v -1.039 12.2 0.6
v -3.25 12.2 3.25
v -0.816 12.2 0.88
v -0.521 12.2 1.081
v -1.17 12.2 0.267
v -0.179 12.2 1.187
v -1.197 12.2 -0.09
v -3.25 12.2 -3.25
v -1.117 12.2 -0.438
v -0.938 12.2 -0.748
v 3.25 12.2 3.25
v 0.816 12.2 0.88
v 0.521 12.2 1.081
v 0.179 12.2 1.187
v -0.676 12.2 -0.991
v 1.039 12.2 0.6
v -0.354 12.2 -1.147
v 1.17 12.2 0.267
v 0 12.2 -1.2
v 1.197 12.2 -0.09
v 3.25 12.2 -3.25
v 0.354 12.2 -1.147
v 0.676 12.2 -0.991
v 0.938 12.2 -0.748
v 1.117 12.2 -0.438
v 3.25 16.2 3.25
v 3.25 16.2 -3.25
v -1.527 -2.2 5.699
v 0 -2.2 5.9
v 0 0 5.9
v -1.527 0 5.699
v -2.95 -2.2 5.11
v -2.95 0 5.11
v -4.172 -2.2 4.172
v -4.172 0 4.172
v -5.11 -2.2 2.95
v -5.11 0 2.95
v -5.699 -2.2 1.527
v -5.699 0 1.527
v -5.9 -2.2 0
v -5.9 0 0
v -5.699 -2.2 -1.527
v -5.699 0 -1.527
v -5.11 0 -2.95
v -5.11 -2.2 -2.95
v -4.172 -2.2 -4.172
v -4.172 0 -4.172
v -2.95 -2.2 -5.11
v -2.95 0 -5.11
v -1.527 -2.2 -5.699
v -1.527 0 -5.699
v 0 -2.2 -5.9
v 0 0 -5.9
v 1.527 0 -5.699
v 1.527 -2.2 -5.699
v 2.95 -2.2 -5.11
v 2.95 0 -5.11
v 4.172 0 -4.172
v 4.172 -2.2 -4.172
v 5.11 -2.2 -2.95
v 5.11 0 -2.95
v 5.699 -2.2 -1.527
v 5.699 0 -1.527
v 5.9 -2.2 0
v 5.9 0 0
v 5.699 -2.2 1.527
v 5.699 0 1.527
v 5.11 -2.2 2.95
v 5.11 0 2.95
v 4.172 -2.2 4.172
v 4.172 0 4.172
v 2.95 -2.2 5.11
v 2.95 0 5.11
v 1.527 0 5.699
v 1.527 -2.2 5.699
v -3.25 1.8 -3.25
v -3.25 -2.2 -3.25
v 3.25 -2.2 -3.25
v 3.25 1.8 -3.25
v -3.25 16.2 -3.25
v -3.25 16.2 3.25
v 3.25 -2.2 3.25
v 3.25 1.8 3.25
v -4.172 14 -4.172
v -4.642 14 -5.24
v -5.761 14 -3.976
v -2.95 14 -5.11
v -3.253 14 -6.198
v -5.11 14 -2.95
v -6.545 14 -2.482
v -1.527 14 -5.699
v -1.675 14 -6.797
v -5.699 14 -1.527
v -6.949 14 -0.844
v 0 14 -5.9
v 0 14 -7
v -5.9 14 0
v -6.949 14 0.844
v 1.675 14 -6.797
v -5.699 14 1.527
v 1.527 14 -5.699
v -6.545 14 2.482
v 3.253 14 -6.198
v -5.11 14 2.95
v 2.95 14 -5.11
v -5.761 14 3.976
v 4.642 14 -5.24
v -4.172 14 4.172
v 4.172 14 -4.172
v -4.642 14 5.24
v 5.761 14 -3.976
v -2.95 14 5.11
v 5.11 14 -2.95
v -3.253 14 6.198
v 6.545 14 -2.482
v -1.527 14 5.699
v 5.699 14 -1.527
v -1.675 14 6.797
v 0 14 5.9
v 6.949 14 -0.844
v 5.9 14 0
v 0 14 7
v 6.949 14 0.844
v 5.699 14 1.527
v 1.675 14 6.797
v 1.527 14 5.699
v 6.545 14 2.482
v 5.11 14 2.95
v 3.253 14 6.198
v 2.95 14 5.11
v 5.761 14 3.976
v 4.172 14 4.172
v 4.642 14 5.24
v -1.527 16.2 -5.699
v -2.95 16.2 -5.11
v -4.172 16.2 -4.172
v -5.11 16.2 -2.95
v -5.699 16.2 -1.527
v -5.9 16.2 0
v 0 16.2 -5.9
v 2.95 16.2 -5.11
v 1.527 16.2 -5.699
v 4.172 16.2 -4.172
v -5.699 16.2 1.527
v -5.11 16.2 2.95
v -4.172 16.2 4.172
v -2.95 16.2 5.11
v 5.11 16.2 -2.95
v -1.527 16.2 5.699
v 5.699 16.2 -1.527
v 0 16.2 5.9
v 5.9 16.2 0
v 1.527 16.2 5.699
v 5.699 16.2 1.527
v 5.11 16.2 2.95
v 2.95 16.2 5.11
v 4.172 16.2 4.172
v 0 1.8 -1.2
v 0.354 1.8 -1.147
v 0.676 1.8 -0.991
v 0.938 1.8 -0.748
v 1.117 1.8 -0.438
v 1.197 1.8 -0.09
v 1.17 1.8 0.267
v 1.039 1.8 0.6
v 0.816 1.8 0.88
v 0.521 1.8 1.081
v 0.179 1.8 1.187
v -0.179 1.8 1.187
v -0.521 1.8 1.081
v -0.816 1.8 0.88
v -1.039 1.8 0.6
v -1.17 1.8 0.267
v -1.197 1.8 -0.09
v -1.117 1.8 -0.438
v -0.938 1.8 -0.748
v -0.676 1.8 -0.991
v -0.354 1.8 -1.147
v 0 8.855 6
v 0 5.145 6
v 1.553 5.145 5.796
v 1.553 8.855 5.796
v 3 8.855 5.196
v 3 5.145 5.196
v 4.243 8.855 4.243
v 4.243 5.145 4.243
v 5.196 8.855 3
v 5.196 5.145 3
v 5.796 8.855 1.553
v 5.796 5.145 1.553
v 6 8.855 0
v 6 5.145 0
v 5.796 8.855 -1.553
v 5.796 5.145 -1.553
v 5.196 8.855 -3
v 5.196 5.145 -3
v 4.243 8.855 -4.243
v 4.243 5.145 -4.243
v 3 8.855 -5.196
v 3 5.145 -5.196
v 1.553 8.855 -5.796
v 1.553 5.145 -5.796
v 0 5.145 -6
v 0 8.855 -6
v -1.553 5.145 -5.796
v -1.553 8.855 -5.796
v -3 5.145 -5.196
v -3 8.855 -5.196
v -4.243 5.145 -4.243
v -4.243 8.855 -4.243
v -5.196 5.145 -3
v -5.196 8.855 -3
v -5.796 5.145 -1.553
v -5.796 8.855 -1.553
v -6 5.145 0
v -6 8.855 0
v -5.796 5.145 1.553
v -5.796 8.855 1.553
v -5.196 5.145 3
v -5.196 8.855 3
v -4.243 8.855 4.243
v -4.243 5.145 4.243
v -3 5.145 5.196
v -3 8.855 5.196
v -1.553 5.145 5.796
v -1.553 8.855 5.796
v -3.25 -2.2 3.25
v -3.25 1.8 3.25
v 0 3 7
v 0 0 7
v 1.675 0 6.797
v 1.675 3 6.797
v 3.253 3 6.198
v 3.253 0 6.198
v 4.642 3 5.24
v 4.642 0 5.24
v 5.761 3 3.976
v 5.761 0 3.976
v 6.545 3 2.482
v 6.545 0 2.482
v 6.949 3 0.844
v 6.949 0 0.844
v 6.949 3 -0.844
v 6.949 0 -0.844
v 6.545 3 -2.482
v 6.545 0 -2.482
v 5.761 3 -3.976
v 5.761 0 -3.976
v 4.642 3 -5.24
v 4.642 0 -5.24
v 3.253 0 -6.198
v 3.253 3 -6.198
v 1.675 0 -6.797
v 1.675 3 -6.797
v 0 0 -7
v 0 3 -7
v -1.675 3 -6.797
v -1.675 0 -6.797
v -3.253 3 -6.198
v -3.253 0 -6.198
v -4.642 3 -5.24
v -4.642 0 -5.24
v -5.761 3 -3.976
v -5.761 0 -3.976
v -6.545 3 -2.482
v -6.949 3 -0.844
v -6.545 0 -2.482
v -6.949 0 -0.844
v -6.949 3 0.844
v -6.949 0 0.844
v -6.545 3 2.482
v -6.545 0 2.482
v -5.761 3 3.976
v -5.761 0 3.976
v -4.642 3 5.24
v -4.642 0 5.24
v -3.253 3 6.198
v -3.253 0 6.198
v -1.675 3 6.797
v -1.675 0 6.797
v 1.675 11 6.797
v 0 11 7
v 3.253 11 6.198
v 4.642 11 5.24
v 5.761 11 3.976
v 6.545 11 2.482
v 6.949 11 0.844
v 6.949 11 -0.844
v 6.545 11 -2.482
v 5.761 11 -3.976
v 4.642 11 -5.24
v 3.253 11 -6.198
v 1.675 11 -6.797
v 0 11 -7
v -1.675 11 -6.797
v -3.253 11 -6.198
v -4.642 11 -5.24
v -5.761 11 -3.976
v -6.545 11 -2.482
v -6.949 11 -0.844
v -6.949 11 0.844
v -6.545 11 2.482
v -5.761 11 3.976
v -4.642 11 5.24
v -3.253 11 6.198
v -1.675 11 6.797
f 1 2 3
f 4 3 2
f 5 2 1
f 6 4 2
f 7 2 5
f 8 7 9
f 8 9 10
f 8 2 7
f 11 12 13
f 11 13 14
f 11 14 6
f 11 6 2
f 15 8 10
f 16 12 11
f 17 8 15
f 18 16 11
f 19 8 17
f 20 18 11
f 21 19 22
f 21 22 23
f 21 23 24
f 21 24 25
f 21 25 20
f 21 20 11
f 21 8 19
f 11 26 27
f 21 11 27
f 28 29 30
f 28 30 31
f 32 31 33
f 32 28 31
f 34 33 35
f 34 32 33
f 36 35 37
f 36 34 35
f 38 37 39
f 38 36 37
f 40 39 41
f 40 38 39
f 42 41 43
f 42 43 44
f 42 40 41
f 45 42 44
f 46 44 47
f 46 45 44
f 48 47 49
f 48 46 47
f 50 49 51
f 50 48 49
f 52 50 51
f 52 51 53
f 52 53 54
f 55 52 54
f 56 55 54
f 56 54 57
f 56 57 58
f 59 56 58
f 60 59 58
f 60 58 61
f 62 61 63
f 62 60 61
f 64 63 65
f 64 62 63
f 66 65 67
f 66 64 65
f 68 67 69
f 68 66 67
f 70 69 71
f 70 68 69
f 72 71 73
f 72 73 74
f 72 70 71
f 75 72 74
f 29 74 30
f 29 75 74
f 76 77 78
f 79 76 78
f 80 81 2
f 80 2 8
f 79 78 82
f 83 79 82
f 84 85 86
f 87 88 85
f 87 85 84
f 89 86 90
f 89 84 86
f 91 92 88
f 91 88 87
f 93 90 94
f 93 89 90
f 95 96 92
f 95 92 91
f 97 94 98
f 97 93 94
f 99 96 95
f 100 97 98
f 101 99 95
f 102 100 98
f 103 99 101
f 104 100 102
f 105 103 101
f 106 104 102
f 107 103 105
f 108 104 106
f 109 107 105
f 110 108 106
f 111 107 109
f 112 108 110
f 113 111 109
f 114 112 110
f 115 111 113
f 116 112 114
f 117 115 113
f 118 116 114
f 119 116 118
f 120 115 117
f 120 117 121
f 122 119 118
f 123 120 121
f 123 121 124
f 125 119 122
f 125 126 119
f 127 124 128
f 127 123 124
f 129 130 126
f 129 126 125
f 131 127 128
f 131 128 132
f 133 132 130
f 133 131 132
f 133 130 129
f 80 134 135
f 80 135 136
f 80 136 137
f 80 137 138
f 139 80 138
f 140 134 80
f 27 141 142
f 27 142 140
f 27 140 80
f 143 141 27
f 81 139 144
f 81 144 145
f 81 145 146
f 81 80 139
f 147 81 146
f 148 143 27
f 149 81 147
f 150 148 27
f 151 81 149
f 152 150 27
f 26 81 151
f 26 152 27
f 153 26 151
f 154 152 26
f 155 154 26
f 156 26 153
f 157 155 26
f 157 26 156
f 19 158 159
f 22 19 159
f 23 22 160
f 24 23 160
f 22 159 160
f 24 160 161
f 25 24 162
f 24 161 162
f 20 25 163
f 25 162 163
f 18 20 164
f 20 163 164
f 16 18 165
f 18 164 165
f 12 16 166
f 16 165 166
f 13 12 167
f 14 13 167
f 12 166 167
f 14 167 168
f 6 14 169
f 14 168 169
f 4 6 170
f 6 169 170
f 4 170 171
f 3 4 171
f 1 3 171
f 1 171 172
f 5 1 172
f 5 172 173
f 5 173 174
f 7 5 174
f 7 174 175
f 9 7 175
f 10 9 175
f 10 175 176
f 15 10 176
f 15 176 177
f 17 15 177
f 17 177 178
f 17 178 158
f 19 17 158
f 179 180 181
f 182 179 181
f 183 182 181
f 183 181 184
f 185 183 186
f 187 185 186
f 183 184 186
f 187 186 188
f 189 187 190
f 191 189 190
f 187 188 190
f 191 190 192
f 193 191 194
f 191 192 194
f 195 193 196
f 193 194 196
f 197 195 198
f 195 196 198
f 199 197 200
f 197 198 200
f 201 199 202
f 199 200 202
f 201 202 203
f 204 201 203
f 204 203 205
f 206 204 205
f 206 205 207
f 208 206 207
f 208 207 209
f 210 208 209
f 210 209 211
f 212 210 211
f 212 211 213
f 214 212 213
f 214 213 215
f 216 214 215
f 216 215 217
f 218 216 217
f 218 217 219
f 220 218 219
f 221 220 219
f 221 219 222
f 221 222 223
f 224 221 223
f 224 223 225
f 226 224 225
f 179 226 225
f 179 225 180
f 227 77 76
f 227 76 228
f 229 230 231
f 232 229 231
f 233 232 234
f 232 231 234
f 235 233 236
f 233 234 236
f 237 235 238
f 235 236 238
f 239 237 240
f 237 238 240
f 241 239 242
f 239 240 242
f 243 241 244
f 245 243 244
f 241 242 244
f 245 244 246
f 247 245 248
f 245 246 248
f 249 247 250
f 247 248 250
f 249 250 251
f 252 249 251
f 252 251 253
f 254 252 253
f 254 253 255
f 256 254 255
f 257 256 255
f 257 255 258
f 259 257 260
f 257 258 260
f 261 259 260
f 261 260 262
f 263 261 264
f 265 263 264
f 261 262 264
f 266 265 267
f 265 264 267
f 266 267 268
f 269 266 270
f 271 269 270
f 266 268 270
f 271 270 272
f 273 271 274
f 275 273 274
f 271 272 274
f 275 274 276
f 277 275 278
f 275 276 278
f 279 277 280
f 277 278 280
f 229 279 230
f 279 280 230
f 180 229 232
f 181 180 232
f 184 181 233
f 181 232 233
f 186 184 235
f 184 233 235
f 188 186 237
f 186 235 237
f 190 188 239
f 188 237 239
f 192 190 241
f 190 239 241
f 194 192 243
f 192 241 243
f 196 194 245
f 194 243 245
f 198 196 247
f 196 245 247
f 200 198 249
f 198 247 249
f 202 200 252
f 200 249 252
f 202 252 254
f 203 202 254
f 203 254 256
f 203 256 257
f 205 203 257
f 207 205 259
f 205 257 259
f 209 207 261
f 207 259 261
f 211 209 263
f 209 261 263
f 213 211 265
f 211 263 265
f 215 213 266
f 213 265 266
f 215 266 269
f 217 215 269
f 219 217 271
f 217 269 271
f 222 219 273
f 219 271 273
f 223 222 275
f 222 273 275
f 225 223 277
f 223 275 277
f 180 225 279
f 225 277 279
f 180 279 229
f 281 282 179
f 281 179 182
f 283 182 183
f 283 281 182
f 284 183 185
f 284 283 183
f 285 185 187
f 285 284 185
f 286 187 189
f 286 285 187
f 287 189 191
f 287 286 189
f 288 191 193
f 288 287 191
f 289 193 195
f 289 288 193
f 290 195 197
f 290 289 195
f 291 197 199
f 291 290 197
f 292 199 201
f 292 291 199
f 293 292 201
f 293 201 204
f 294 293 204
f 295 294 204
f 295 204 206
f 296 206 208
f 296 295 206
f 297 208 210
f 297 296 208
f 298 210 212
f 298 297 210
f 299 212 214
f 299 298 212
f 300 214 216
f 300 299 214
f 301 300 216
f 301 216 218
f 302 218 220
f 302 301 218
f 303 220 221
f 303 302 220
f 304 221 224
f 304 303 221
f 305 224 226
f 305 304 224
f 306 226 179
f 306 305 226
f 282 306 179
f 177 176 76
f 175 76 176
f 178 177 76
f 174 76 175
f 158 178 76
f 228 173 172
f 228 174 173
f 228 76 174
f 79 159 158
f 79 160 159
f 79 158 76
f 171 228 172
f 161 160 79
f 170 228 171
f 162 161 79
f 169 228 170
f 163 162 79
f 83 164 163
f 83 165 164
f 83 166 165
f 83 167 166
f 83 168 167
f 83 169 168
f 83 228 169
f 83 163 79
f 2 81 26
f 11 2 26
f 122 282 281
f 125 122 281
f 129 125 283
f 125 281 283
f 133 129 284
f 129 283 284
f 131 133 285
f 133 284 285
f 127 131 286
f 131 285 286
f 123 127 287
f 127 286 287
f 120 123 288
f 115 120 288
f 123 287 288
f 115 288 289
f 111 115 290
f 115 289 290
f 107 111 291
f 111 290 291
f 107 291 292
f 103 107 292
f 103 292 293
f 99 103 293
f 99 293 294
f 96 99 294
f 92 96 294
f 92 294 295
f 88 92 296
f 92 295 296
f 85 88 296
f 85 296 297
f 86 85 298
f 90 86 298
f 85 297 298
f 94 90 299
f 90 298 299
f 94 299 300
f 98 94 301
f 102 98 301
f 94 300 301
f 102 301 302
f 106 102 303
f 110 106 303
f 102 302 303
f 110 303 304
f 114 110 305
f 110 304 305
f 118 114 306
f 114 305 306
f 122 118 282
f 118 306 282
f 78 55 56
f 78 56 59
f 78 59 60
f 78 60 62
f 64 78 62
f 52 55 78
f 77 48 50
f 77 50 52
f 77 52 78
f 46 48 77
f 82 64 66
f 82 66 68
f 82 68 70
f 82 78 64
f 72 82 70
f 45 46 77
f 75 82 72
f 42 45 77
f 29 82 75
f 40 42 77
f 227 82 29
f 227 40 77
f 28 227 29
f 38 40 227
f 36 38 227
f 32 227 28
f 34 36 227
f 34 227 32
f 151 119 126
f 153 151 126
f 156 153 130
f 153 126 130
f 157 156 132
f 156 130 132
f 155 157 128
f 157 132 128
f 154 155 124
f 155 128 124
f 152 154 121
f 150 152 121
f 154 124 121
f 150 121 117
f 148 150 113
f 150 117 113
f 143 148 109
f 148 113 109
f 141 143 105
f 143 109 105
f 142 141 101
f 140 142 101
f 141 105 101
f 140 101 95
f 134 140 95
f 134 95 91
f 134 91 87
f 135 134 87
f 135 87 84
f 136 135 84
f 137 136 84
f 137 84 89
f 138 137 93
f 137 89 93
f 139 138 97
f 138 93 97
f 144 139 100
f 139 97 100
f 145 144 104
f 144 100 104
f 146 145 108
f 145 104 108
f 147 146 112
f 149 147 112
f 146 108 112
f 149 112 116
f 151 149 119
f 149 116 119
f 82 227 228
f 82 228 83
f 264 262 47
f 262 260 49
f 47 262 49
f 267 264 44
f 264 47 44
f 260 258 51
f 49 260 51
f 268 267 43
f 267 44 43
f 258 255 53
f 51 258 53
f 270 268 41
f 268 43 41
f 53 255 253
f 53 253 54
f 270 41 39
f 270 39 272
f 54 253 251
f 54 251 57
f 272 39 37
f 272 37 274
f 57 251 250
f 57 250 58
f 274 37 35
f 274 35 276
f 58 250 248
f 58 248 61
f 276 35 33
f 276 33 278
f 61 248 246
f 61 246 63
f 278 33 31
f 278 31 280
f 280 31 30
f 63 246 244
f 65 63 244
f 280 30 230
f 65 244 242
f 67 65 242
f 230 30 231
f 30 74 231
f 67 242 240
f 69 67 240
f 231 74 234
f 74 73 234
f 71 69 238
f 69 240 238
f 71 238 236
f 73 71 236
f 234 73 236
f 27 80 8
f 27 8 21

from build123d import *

# Parameters (mm, degrees)
SKETCH_1_R          = 7
EXTRUDE_1_DEPTH     = 3
SKETCH_2_R          = 6
EXTRUDE_2_DEPTH     = 8
SKETCH_3_R          = 7
EXTRUDE_3_DEPTH     = 3
CHAMFER_1_SIZE      = 2.144506921
CHAMFER_1_SIZE_2    = 1
CHAMFER_2_SIZE      = 2.144506921
CHAMFER_2_SIZE_2    = 1
SKETCH_4_R          = 5.9
EXTRUDE_4_DEPTH     = 2.2
EXTRUDE_START       = 2.2
SKETCH_5_R          = 5.9
EXTRUDE_5_DEPTH     = 2.2
SKETCH_6_W          = 6.5
SKETCH_6_H          = 6.5
CUT_EXTRUDE_1_DEPTH = 4
SKETCH_7_W          = 6.5
SKETCH_7_H          = 6.5
CUT_EXTRUDE_2_DEPTH = 4
SKETCH_8_R          = 1.2
CUT_EXTRUDE_3_DEPTH = 18.474552927


with BuildPart() as part:
    # Эскиз1 → Бобышка-Вытянуть1 (new body)
    with BuildSketch(Plane(origin=(0, 0, 0), x_dir=(1, 0, 0), z_dir=(0, 1, 0))):
        with Locations(Location((0, 0, 0), (0, 0, 270))):
            Circle(SKETCH_1_R)
    extrude(amount=EXTRUDE_1_DEPTH)

    # Эскиз2 → Бобышка-Вытянуть2 (add)
    with BuildSketch(Plane(origin=(0, 3, 0), x_dir=(1, 0, 0), z_dir=(0, 1, 0))):
        with Locations(Location((0, 0, 0), (0, 0, 270))):
            Circle(SKETCH_2_R)
    extrude(amount=EXTRUDE_2_DEPTH)

    # Эскиз3 → Бобышка-Вытянуть3 (add)
    with BuildSketch(Plane(origin=(0, 11, 0), x_dir=(1, 0, 0), z_dir=(0, 1, 0))):
        with Locations(Location((0, 0, 0), (0, 0, 270))):
            Circle(SKETCH_3_R)
    extrude(amount=EXTRUDE_3_DEPTH)

    # Фаска1
    # the kernel refuses this chamfer: 2.144506921, 1 mm, written as the material it adds along each edge
    with BuildSketch(Plane(origin=(0, 3, 0), x_dir=(0, 0, 1), z_dir=(-1, 0, 0))) as chamfer_1_piece_1_section:
        Polygon((6, CHAMFER_1_SIZE), (6 + CHAMFER_1_SIZE_2, 0), (6, 0), align=None)
    chamfer_1_piece_1 = revolve(axis=Axis((0, 3, 0), (0, 1, 0)), mode=Mode.PRIVATE)
    chamfer_1_piece_1 = chamfer_1_piece_1 & Plane(origin=(0, 4.095664656, 0), x_dir=(0, 0, 1), z_dir=(0, -1, 0)) * Cylinder(7, 28, mode=Mode.PRIVATE)
    add(chamfer_1_piece_1)

    # Фаска2
    # the kernel refuses this chamfer: 2.144506921, 1 mm, written as the material it adds along each edge
    with BuildSketch(Plane(origin=(0, 11, 0), x_dir=(0, 0, 1), z_dir=(-1, 0, 0))) as chamfer_2_piece_1_section:
        Polygon((6, -CHAMFER_2_SIZE), (6 + CHAMFER_2_SIZE_2, 0), (6, 0), align=None)
    chamfer_2_piece_1 = revolve(axis=Axis((0, 11, 0), (0, 1, 0)), mode=Mode.PRIVATE)
    chamfer_2_piece_1 = chamfer_2_piece_1 & Plane(origin=(0, 9.904335344, 0), x_dir=(0, 0, 1), z_dir=(0, -1, 0)) * Cylinder(7, 28, mode=Mode.PRIVATE)
    add(chamfer_2_piece_1)

    # Эскиз4 → Бобышка-Вытянуть4 (add)
    with BuildSketch(Plane(origin=(0, 14, 0), x_dir=(1, 0, 0), z_dir=(0, 1, 0))):
        with Locations(Location((0, 0, 0), (0, 0, 270))):
            Circle(SKETCH_4_R)
    extrude(amount=EXTRUDE_4_DEPTH)

    # Эскиз5 → Бобышка-Вытянуть5 (add)
    with BuildSketch(Plane.XZ.offset(EXTRUDE_START)):
        with Locations(Location((0, 0, 0), (0, 0, 90))):
            Circle(SKETCH_5_R)
    extrude(amount=-EXTRUDE_5_DEPTH)

    # Эскиз6 → Вырез-Вытянуть1 (cut)
    with BuildSketch(Plane(origin=(0, 16.2, 0), x_dir=(1, 0, 0), z_dir=(0, 1, 0))):
        Rectangle(SKETCH_6_W, SKETCH_6_H)
    extrude(amount=-CUT_EXTRUDE_1_DEPTH, mode=Mode.SUBTRACT)

    # Эскиз7 → Вырез-Вытянуть2 (cut)
    with BuildSketch(Plane.XZ.offset(2.2)):
        Rectangle(SKETCH_7_W, SKETCH_7_H)
    extrude(amount=-CUT_EXTRUDE_2_DEPTH, mode=Mode.SUBTRACT)

    # Эскиз8 → Вырез-Вытянуть3 (cut, through all)
    with BuildSketch(Plane.XZ.offset(-1.8)):
        with Locations(Location((0, 0, 0), (0, 0, 270))):
            Circle(SKETCH_8_R)
    extrude(amount=-CUT_EXTRUDE_3_DEPTH, mode=Mode.SUBTRACT)


solid = part.part
